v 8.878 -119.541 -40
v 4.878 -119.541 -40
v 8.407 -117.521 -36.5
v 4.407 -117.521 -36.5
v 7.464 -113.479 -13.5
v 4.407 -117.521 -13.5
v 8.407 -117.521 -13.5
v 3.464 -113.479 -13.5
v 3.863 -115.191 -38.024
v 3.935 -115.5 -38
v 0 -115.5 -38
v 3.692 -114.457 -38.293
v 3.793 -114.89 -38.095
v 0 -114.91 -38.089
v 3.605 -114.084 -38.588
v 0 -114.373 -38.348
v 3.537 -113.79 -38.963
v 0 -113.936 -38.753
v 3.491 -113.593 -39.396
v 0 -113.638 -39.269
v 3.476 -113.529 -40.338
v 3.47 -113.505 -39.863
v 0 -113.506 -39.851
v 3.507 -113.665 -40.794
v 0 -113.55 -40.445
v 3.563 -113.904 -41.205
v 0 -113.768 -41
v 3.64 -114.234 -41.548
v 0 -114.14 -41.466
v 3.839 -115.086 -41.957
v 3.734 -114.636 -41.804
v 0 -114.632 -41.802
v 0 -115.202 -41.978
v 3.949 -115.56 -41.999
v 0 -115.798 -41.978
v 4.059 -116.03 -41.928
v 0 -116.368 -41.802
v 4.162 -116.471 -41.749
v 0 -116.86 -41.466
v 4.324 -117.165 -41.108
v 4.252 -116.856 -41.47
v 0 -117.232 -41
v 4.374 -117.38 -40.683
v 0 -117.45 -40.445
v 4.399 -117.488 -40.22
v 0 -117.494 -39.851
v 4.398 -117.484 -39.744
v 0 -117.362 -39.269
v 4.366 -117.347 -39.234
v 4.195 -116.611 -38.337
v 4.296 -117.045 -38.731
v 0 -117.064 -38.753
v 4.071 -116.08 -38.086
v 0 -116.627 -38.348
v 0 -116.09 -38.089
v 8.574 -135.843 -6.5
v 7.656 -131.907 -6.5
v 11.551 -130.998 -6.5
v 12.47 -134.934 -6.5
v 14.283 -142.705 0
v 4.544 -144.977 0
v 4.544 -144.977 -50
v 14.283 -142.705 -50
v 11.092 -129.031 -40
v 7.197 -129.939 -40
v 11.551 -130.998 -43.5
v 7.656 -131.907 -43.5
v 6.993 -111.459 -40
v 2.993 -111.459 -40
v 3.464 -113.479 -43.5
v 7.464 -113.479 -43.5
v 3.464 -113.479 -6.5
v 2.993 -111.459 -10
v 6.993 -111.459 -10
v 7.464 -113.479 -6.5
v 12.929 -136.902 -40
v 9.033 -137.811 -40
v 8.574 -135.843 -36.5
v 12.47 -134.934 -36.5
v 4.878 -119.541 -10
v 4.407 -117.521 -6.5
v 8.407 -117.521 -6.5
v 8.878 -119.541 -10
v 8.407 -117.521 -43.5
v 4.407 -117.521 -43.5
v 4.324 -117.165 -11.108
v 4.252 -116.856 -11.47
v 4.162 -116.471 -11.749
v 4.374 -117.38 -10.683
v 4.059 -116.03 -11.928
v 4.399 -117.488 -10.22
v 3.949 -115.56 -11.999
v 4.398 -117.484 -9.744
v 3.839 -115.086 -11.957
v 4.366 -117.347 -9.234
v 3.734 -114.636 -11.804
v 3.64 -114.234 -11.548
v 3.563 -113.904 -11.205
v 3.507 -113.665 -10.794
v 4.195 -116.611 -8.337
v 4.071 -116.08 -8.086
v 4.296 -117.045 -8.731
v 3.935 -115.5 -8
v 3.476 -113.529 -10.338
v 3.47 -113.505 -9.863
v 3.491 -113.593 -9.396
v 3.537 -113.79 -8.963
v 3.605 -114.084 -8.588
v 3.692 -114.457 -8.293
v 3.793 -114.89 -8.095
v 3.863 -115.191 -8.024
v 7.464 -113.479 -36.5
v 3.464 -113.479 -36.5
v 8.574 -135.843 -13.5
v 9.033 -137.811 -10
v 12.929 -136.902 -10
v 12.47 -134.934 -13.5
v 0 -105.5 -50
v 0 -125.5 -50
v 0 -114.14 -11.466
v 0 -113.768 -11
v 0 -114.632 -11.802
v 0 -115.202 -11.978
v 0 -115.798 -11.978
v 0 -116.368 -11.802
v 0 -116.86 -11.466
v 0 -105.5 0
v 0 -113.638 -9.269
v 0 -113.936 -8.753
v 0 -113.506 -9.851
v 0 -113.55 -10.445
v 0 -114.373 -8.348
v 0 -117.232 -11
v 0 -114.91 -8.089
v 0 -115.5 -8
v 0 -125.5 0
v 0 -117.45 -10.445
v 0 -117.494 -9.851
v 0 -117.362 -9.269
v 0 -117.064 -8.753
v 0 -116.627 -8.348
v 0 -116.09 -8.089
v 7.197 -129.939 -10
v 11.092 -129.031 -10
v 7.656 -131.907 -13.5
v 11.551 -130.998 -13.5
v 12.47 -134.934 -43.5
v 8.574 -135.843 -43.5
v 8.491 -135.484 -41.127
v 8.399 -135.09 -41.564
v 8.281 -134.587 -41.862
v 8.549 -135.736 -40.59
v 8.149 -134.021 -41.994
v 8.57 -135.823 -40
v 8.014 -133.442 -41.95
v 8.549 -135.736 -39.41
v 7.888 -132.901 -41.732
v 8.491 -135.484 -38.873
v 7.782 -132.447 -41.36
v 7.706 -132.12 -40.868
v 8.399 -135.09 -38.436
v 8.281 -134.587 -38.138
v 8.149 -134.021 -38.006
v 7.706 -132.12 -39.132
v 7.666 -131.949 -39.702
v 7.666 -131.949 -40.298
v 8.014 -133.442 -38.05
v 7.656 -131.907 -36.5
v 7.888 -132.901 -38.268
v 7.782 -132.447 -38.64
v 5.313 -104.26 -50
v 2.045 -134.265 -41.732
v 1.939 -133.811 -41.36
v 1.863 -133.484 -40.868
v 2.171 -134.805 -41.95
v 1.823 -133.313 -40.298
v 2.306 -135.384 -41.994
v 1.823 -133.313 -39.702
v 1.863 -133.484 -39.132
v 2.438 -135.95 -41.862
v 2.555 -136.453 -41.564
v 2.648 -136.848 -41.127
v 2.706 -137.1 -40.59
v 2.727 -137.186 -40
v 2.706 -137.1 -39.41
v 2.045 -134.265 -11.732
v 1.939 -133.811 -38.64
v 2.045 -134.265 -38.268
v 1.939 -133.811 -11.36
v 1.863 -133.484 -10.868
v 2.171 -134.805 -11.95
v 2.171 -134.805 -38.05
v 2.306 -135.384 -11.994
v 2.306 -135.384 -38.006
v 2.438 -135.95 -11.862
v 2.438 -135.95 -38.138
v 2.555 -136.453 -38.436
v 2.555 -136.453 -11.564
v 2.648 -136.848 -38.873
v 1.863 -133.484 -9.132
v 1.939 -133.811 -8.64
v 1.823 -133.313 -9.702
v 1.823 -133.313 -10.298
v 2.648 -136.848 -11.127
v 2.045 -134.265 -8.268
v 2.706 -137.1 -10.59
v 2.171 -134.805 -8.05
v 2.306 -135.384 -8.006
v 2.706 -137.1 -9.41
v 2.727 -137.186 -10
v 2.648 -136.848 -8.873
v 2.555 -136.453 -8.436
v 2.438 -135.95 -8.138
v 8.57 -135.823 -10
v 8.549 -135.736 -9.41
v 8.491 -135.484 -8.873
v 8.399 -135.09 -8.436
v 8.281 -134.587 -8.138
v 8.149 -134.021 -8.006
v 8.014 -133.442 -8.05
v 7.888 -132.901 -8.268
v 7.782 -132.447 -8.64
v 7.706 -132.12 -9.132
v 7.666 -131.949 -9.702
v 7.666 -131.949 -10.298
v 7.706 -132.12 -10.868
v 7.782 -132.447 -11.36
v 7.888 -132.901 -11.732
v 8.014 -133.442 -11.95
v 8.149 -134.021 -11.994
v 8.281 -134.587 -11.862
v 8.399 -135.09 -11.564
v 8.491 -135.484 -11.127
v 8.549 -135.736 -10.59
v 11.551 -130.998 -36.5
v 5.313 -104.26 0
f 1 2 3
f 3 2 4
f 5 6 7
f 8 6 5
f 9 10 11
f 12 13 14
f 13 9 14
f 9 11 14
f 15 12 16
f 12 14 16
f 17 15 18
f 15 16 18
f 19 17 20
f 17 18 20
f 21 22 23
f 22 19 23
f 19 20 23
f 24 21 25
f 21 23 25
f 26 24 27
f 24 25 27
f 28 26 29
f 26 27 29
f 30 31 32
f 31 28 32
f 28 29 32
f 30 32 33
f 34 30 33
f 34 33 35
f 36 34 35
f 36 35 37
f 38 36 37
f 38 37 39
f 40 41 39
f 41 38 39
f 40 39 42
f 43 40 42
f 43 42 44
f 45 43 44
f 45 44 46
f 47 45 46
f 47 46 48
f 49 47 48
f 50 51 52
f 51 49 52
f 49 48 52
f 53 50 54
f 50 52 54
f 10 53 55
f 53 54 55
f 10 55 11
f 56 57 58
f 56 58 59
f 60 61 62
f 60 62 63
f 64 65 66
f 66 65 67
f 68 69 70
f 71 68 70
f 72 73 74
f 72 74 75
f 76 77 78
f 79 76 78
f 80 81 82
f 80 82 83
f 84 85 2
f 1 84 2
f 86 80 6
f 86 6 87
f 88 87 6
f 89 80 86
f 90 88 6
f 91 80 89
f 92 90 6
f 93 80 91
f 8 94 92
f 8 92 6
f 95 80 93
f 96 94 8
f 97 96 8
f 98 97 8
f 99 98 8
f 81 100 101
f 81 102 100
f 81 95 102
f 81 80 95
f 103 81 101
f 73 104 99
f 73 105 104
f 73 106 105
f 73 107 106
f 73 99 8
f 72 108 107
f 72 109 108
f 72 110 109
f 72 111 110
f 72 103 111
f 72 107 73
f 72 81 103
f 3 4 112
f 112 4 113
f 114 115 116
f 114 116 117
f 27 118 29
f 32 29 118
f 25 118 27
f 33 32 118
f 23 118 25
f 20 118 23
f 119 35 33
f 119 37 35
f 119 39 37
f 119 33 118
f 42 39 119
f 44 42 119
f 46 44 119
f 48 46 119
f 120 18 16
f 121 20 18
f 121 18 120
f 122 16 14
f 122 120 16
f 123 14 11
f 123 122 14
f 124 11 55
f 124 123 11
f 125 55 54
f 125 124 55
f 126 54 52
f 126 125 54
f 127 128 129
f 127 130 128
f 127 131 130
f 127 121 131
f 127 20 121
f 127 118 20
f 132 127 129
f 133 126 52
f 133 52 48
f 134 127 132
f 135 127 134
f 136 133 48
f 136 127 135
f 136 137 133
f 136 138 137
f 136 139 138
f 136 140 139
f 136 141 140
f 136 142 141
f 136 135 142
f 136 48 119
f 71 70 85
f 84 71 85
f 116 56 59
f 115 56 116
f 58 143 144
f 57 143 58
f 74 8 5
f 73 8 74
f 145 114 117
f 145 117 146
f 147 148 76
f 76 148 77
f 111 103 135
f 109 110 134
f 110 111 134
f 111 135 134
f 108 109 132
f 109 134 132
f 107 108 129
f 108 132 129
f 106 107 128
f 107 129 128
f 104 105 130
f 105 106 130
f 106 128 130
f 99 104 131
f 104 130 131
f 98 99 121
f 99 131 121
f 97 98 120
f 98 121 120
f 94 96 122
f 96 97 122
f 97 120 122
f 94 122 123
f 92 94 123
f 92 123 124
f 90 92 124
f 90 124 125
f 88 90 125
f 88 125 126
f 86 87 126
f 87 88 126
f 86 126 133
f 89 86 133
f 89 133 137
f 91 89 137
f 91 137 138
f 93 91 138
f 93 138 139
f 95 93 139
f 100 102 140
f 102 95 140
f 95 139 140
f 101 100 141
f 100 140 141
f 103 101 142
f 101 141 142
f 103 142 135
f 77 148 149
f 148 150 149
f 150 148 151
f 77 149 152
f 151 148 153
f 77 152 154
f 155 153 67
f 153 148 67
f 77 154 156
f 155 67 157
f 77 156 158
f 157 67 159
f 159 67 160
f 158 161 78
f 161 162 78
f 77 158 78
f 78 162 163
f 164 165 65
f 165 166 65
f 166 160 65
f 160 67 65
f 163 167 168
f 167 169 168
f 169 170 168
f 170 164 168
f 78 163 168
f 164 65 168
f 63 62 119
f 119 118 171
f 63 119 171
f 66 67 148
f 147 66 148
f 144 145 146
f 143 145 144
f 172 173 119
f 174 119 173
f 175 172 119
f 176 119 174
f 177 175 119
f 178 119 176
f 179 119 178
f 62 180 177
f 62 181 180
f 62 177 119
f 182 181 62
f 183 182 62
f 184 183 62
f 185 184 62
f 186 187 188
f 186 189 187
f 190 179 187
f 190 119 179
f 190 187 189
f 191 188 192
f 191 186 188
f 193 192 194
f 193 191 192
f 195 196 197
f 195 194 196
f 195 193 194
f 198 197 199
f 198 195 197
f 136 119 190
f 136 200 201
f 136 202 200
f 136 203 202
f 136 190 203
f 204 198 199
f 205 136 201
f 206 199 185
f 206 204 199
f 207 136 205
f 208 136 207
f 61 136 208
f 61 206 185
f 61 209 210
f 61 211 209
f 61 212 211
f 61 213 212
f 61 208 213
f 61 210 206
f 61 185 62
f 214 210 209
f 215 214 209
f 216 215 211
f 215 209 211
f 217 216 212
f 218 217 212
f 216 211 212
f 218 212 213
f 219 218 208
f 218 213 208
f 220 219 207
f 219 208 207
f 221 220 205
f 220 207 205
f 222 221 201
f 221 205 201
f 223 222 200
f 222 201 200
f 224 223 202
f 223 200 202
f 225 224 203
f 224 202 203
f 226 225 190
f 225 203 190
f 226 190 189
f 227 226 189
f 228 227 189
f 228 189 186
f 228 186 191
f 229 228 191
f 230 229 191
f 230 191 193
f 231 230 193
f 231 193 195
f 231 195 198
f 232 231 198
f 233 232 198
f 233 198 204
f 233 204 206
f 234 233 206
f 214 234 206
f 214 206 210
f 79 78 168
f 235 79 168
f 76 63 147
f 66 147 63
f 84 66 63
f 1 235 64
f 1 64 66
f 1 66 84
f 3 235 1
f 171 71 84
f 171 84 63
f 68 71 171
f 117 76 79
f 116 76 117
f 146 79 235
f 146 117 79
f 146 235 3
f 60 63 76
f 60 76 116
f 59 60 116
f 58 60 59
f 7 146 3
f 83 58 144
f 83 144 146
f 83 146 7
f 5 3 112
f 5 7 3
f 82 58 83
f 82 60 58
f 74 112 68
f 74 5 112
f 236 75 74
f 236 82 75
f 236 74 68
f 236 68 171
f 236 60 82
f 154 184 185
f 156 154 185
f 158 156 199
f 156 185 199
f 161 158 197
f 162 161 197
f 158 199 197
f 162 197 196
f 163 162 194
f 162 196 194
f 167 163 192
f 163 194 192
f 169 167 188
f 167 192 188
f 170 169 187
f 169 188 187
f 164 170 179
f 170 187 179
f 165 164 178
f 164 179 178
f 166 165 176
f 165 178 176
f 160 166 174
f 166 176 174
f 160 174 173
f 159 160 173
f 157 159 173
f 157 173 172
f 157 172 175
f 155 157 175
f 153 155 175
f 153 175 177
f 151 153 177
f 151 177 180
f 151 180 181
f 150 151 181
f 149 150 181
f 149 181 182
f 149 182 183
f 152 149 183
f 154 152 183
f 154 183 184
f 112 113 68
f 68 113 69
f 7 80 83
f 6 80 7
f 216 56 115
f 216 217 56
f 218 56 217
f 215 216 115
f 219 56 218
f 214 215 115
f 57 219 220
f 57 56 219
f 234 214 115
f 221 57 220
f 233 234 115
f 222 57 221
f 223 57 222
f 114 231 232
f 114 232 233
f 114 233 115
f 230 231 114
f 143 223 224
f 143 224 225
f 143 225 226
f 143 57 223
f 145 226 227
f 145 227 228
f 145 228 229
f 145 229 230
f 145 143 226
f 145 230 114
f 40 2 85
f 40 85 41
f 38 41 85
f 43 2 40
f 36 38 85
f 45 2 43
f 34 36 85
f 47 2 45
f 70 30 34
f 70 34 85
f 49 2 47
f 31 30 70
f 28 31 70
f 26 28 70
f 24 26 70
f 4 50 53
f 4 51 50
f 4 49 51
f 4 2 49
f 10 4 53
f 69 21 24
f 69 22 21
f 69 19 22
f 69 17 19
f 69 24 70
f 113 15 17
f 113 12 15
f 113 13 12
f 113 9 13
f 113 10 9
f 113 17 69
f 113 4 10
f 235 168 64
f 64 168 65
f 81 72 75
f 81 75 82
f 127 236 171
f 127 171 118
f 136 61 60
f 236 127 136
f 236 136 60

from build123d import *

# Parameters (mm, degrees)
BOSS_EXTRUDE1_DEPTH = 50
SKETCH2_R           = 2
CUT_EXTRUDE1_DEPTH  = 50
CUT_EXTRUDE2_REACH  = 160.02
SKETCH2_3_R         = 2
SKETCH3_R           = 2
CUT_EXTRUDE3_DEPTH  = 154.134111759
CUT_EXTRUDE4_START  = -6
SKETCH3_3_R         = 2
CUT_EXTRUDE4_DEPTH  = 4


with BuildPart() as part:
    # Sketch1 → Boss-Extrude1 (new body)
    with BuildSketch(Plane.XY):
        Polygon((0, -105.5), (0, -125.5), (4.544210652, -144.976913245), (14.282667274, -142.704807919), (5.313096791, -104.260387197), align=None)
    extrude(amount=-BOSS_EXTRUDE1_DEPTH)

    # Sketch2 → Cut-Extrude1 (cut)
    with BuildSketch(Plane.ZY):
        with Locations((-40, -115.5)):
            Circle(SKETCH2_R)
        with Locations((-10, -115.5)):
            Circle(SKETCH2_R)
    extrude(amount=-CUT_EXTRUDE1_DEPTH, mode=Mode.SUBTRACT)

    # Cut-Extrude2: from a plane face, 160.02 long prism both ways, kept between that surface and its translate by the depth
    cut_extrude2_start = Plane(origin=(14.282667274, -142.704807919, -50), z_dir=(0.9738456622517382, 0.227210532576009, 0)) * Box(642.08, 642.08, 321.04, align=(Align.CENTER, Align.CENTER, Align.MIN), mode=Mode.PRIVATE)
    cut_extrude2_end = Plane(origin=(10.282667274, -142.704807919, -50), z_dir=(0.9738456622517382, 0.227210532576009, 0)) * Box(642.08, 642.08, 321.04, align=(Align.CENTER, Align.CENTER, Align.MIN), mode=Mode.PRIVATE)
    # Sketch2<3> → Cut-Extrude2 (cut, from a surface)
    with BuildSketch(Plane.ZY, mode=Mode.PRIVATE) as cut_extrude2_sk1:
        Polygon((-36.5, -117.520725942), (-36.5, -113.479274058), (-40, -111.458548116), (-43.5, -113.479274058), (-43.5, -117.520725942), (-40, -119.541451884), align=None)
        with Locations((-40, -115.5)):
            Circle(SKETCH2_3_R, mode=Mode.SUBTRACT)
    cut_extrude2_tool1 = extrude(cut_extrude2_sk1.sketch, amount=CUT_EXTRUDE2_REACH, both=True, mode=Mode.PRIVATE)
    add(((cut_extrude2_tool1 - cut_extrude2_start) & cut_extrude2_end).solids().sort_by_distance((5.935441, -115.5, -36.606927))[0], mode=Mode.SUBTRACT)
    # Sketch2<3> → Cut-Extrude2 (cut, from a surface)
    with BuildSketch(Plane.ZY, mode=Mode.PRIVATE) as cut_extrude2_sk2:
        Polygon((-10, -111.458548116), (-6.5, -113.479274058), (-6.5, -117.520725942), (-10, -119.541451884), (-13.5, -117.520725942), (-13.5, -113.479274058), align=None)
        with Locations((-10, -115.5)):
            Circle(SKETCH2_3_R, mode=Mode.SUBTRACT)
    cut_extrude2_tool2 = extrude(cut_extrude2_sk2.sketch, amount=CUT_EXTRUDE2_REACH, both=True, mode=Mode.PRIVATE)
    add(((cut_extrude2_tool2 - cut_extrude2_start) & cut_extrude2_end).solids().sort_by_distance((5.935441, -115.5, -36.606927))[0], mode=Mode.SUBTRACT)

    # Sketch3 → Cut-Extrude3 (cut, through all)
    with BuildSketch(Plane(origin=(-27.769132942, -6.478890577, 0), x_dir=(0, 0, 1), z_dir=(-0.973845662251742, -0.22721053257599275, 0))):
        with Locations(Location((-40, -132.217630613, 0), (0, 0, 270))):
            Circle(SKETCH3_R)
        with Locations(Location((-10, -132.217630613, 0), (0, 0, 270))):
            Circle(SKETCH3_R)
    extrude(amount=-CUT_EXTRUDE3_DEPTH, mode=Mode.SUBTRACT)

    # Sketch3<3> → Cut-Extrude4 (cut)
    # profile 1 of 2: a face of its own
    with BuildSketch(Plane(origin=(-27.769132942, -6.478890577, 0), x_dir=(0, 0, 1), z_dir=(-0.973845662251742, -0.22721053257599275, 0)).offset(CUT_EXTRUDE4_START)):
        Polygon((-36.5, -134.238356555), (-36.5, -130.19690467), (-40, -128.176178728), (-43.5, -130.19690467), (-43.5, -134.238356555), (-40, -136.259082497), align=None)
        with Locations(Location((-40, -132.217630613, 0), (0, 0, 270))):
            Circle(SKETCH3_3_R, mode=Mode.SUBTRACT)
    # profile 2 of 2: a face of its own
    with BuildSketch(Plane(origin=(-27.769132942, -6.478890577, 0), x_dir=(0, 0, 1), z_dir=(-0.973845662251742, -0.22721053257599275, 0)).offset(CUT_EXTRUDE4_START)):
        Polygon((-10, -128.176178728), (-6.5, -130.19690467), (-6.5, -134.238356555), (-10, -136.259082497), (-13.5, -134.238356555), (-13.5, -130.19690467), align=None)
        with Locations(Location((-10, -132.217630613, 0), (0, 0, 270))):
            Circle(SKETCH3_3_R, mode=Mode.SUBTRACT)
    extrude(amount=-CUT_EXTRUDE4_DEPTH, mode=Mode.SUBTRACT)


solid = part.part
